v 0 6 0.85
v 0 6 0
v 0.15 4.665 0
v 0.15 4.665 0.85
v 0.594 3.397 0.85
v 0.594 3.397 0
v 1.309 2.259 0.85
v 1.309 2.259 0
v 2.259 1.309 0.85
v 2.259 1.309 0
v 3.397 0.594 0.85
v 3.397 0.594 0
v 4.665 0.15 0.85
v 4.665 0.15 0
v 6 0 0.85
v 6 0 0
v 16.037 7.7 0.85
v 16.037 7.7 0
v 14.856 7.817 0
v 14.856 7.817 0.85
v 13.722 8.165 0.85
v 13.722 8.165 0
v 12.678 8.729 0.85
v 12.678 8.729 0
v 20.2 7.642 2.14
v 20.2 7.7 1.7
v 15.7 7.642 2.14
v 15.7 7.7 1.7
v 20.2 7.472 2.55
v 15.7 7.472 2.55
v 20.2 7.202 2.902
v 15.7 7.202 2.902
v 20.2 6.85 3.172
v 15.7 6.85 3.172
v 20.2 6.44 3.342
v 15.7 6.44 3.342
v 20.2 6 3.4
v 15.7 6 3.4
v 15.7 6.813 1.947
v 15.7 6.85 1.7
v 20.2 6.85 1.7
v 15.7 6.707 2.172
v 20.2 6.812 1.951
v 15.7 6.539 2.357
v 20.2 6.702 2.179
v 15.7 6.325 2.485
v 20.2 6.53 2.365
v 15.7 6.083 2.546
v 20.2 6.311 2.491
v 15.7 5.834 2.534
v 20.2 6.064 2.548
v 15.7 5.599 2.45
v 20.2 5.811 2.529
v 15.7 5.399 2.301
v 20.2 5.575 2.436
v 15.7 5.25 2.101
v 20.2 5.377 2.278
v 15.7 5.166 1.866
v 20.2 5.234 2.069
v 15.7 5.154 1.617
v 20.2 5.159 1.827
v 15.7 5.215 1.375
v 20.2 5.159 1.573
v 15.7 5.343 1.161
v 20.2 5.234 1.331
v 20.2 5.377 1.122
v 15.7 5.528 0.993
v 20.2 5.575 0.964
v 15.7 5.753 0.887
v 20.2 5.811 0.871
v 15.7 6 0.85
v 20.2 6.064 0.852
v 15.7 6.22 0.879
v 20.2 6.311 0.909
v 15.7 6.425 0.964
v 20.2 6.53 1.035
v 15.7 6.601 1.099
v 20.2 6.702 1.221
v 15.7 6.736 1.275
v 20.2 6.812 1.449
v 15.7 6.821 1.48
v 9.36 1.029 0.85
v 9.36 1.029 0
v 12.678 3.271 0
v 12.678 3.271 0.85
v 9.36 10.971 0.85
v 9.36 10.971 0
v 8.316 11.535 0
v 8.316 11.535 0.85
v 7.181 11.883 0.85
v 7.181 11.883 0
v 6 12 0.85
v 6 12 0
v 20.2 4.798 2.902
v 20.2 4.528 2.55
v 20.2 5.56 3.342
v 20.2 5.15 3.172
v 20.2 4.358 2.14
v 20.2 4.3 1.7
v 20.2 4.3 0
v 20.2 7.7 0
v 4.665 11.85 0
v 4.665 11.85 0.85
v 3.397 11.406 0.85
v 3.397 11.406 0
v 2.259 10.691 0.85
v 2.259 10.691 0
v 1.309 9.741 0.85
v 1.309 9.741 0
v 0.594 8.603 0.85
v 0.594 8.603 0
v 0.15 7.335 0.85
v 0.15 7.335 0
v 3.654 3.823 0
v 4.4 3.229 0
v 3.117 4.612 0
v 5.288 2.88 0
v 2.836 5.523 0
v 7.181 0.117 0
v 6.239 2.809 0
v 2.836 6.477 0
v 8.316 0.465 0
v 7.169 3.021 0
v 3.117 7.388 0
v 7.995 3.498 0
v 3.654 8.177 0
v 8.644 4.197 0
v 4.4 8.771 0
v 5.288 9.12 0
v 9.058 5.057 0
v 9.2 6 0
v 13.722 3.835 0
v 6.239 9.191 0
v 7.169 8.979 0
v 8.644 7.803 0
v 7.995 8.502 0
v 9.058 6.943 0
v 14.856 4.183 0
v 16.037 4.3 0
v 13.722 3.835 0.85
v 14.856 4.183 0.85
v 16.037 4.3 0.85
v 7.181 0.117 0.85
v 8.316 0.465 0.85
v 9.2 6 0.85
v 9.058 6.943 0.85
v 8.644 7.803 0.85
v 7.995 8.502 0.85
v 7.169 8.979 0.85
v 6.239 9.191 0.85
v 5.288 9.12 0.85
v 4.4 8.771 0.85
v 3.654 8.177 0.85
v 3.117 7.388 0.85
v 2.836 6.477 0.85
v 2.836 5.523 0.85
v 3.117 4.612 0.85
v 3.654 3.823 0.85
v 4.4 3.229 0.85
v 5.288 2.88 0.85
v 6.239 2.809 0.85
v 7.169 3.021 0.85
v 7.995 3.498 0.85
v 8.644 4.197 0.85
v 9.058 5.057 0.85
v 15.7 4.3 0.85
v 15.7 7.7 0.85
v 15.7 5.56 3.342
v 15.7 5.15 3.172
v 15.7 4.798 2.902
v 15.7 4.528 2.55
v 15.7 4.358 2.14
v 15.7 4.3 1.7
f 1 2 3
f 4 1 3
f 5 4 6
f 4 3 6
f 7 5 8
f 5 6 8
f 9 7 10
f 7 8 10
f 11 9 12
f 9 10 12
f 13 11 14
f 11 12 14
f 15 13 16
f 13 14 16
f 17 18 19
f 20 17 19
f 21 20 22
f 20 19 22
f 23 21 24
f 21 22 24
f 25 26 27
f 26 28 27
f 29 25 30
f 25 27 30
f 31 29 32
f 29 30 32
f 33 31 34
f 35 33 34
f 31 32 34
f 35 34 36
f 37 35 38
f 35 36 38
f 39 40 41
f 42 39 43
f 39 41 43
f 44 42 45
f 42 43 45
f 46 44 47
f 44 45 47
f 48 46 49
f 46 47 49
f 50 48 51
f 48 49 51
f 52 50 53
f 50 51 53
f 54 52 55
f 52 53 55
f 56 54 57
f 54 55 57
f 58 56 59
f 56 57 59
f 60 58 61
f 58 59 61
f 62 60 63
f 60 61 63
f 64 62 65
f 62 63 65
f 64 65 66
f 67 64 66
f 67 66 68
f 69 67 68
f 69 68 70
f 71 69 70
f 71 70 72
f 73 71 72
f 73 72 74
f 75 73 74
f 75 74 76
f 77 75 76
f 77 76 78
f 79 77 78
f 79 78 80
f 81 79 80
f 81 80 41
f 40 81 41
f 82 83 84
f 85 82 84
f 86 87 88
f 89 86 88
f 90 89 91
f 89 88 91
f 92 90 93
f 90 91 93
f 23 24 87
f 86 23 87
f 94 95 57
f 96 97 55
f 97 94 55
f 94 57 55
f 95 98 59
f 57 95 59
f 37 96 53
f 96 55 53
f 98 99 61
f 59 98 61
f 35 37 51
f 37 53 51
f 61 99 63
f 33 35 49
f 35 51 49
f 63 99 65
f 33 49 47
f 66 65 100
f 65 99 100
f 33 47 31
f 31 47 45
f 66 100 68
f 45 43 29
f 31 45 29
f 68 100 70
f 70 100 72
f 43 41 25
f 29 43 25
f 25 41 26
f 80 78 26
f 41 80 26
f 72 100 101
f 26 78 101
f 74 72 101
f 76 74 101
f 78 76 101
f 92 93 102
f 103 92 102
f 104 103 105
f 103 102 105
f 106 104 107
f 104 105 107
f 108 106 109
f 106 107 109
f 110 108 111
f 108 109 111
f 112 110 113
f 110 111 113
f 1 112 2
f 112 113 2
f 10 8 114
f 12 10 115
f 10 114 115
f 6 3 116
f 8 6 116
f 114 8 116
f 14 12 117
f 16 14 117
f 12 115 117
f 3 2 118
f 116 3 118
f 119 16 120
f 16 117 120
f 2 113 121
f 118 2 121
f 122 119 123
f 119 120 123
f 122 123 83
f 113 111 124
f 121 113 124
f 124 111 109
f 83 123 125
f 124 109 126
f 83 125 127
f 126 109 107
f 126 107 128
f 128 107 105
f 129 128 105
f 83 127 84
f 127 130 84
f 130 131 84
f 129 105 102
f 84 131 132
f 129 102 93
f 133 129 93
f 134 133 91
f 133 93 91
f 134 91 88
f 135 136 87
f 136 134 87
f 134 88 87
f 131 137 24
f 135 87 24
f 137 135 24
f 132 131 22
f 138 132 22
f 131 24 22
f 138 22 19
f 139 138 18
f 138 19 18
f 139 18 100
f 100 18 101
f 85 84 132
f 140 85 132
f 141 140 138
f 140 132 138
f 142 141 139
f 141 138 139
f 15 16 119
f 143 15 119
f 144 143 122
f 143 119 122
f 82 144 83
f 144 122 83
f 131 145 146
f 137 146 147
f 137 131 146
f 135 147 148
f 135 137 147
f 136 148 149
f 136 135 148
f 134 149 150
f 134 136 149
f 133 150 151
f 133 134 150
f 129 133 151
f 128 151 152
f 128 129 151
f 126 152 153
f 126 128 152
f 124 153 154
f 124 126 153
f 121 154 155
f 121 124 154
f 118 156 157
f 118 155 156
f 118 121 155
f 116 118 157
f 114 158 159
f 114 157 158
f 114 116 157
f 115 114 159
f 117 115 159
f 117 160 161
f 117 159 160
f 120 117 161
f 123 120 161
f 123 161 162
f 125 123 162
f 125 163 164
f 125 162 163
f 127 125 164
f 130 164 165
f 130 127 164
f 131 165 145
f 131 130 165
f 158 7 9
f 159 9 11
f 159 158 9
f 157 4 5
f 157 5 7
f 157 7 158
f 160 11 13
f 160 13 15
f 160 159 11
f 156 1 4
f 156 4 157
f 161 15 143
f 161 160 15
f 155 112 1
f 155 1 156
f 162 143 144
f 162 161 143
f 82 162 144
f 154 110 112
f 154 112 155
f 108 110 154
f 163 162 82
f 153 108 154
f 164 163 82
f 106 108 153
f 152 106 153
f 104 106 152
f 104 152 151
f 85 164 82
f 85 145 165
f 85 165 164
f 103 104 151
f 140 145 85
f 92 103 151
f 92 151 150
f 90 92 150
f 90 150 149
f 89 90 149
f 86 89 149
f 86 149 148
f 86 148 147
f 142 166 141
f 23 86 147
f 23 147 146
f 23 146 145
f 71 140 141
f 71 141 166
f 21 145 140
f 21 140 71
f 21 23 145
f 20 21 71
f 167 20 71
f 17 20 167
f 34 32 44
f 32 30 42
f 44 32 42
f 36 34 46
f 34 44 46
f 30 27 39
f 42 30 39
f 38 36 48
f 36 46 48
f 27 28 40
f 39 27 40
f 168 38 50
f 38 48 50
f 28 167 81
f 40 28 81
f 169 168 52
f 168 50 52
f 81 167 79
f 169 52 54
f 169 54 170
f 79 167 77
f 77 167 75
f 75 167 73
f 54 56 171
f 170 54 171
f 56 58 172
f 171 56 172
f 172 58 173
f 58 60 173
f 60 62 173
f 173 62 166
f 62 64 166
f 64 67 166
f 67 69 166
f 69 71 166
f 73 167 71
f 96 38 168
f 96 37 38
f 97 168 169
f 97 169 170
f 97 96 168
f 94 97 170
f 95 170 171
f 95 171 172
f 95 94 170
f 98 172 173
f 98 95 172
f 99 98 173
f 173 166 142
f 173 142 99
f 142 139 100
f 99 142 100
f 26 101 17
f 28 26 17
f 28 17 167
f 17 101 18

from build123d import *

# Parameters (mm, degrees)
F0_R     = 3.2
F1_DEPTH = 0.85
F3_DEPTH = 2.55
F4_R     = 1.69999
F5_R     = 0.85
F6_DEPTH = 25


# Not quite as in the source:
# - a fillet or chamfer is up to 0.001 mm smaller than in the source, because OpenCascade refuses the exact size


with BuildPart() as f1:
    # F0 (on Top) → F1 (new body)
    with BuildSketch(Plane.XY):
        with BuildLine():
            Line((16.0373335058, 4.3), (20.2, 4.3))
            Line((20.2, 4.3), (20.2, 7.7))
            Line((20.2, 7.7), (16.0373335058, 7.7))
            ThreePointArc((16.0373335058, 7.7), (14.2805243712, 7.9629605488), (12.6777057346, 8.7287927785))
            Line((12.6777057346, 8.7287927785), (9.3596277711, 10.9712072215))
            ThreePointArc((9.3596277711, 10.9712072215), (7.7568091346, 11.7370394512), (6, 12))
            ThreePointArc((6, 12), (1.7573593129, 10.2426406871), (0, 6))
            ThreePointArc((0, 6), (1.7573593129, 1.7573593129), (6, 0))
            ThreePointArc((6, 0), (7.7568091346, 0.2629605488), (9.3596277711, 1.0287927785))
            Line((9.3596277711, 1.0287927785), (12.6777057346, 3.2712072215))
            ThreePointArc((12.6777057346, 3.2712072215), (14.2805243712, 4.0370394512), (16.0373335058, 4.3))
        make_face()
        with Locations((6, 6)):
            Circle(F0_R, mode=Mode.SUBTRACT)
    extrude(amount=F1_DEPTH)

    # F2 (on face) → F3 (join)
    with BuildSketch(Plane.XY.offset(0.85)):
        Polygon((20.2, 4.3), (20.2, 7.7), (16.0373335058, 7.7), (15.7, 7.7), (15.7, 4.3), (16.0373335058, 4.3), align=None)
    extrude(amount=F3_DEPTH)

    # F4 (radius 1.7 in the source; OpenCascade refuses exactly that, so slightly less here)
    f4_edges = [f1.edges().sort_by_distance(p)[0] for p in [
        (17.95, 7.7, 3.4),
        (17.95, 4.3, 3.4),
    ]]
    fillet(f4_edges, radius=F4_R)

    # F5 (on face) → F6 (cut)
    with BuildSketch(Plane.YZ.offset(20.2)):
        with Locations((6, 1.7)):
            Circle(F5_R)
    extrude(amount=-F6_DEPTH, mode=Mode.SUBTRACT)


solid = f1.part
